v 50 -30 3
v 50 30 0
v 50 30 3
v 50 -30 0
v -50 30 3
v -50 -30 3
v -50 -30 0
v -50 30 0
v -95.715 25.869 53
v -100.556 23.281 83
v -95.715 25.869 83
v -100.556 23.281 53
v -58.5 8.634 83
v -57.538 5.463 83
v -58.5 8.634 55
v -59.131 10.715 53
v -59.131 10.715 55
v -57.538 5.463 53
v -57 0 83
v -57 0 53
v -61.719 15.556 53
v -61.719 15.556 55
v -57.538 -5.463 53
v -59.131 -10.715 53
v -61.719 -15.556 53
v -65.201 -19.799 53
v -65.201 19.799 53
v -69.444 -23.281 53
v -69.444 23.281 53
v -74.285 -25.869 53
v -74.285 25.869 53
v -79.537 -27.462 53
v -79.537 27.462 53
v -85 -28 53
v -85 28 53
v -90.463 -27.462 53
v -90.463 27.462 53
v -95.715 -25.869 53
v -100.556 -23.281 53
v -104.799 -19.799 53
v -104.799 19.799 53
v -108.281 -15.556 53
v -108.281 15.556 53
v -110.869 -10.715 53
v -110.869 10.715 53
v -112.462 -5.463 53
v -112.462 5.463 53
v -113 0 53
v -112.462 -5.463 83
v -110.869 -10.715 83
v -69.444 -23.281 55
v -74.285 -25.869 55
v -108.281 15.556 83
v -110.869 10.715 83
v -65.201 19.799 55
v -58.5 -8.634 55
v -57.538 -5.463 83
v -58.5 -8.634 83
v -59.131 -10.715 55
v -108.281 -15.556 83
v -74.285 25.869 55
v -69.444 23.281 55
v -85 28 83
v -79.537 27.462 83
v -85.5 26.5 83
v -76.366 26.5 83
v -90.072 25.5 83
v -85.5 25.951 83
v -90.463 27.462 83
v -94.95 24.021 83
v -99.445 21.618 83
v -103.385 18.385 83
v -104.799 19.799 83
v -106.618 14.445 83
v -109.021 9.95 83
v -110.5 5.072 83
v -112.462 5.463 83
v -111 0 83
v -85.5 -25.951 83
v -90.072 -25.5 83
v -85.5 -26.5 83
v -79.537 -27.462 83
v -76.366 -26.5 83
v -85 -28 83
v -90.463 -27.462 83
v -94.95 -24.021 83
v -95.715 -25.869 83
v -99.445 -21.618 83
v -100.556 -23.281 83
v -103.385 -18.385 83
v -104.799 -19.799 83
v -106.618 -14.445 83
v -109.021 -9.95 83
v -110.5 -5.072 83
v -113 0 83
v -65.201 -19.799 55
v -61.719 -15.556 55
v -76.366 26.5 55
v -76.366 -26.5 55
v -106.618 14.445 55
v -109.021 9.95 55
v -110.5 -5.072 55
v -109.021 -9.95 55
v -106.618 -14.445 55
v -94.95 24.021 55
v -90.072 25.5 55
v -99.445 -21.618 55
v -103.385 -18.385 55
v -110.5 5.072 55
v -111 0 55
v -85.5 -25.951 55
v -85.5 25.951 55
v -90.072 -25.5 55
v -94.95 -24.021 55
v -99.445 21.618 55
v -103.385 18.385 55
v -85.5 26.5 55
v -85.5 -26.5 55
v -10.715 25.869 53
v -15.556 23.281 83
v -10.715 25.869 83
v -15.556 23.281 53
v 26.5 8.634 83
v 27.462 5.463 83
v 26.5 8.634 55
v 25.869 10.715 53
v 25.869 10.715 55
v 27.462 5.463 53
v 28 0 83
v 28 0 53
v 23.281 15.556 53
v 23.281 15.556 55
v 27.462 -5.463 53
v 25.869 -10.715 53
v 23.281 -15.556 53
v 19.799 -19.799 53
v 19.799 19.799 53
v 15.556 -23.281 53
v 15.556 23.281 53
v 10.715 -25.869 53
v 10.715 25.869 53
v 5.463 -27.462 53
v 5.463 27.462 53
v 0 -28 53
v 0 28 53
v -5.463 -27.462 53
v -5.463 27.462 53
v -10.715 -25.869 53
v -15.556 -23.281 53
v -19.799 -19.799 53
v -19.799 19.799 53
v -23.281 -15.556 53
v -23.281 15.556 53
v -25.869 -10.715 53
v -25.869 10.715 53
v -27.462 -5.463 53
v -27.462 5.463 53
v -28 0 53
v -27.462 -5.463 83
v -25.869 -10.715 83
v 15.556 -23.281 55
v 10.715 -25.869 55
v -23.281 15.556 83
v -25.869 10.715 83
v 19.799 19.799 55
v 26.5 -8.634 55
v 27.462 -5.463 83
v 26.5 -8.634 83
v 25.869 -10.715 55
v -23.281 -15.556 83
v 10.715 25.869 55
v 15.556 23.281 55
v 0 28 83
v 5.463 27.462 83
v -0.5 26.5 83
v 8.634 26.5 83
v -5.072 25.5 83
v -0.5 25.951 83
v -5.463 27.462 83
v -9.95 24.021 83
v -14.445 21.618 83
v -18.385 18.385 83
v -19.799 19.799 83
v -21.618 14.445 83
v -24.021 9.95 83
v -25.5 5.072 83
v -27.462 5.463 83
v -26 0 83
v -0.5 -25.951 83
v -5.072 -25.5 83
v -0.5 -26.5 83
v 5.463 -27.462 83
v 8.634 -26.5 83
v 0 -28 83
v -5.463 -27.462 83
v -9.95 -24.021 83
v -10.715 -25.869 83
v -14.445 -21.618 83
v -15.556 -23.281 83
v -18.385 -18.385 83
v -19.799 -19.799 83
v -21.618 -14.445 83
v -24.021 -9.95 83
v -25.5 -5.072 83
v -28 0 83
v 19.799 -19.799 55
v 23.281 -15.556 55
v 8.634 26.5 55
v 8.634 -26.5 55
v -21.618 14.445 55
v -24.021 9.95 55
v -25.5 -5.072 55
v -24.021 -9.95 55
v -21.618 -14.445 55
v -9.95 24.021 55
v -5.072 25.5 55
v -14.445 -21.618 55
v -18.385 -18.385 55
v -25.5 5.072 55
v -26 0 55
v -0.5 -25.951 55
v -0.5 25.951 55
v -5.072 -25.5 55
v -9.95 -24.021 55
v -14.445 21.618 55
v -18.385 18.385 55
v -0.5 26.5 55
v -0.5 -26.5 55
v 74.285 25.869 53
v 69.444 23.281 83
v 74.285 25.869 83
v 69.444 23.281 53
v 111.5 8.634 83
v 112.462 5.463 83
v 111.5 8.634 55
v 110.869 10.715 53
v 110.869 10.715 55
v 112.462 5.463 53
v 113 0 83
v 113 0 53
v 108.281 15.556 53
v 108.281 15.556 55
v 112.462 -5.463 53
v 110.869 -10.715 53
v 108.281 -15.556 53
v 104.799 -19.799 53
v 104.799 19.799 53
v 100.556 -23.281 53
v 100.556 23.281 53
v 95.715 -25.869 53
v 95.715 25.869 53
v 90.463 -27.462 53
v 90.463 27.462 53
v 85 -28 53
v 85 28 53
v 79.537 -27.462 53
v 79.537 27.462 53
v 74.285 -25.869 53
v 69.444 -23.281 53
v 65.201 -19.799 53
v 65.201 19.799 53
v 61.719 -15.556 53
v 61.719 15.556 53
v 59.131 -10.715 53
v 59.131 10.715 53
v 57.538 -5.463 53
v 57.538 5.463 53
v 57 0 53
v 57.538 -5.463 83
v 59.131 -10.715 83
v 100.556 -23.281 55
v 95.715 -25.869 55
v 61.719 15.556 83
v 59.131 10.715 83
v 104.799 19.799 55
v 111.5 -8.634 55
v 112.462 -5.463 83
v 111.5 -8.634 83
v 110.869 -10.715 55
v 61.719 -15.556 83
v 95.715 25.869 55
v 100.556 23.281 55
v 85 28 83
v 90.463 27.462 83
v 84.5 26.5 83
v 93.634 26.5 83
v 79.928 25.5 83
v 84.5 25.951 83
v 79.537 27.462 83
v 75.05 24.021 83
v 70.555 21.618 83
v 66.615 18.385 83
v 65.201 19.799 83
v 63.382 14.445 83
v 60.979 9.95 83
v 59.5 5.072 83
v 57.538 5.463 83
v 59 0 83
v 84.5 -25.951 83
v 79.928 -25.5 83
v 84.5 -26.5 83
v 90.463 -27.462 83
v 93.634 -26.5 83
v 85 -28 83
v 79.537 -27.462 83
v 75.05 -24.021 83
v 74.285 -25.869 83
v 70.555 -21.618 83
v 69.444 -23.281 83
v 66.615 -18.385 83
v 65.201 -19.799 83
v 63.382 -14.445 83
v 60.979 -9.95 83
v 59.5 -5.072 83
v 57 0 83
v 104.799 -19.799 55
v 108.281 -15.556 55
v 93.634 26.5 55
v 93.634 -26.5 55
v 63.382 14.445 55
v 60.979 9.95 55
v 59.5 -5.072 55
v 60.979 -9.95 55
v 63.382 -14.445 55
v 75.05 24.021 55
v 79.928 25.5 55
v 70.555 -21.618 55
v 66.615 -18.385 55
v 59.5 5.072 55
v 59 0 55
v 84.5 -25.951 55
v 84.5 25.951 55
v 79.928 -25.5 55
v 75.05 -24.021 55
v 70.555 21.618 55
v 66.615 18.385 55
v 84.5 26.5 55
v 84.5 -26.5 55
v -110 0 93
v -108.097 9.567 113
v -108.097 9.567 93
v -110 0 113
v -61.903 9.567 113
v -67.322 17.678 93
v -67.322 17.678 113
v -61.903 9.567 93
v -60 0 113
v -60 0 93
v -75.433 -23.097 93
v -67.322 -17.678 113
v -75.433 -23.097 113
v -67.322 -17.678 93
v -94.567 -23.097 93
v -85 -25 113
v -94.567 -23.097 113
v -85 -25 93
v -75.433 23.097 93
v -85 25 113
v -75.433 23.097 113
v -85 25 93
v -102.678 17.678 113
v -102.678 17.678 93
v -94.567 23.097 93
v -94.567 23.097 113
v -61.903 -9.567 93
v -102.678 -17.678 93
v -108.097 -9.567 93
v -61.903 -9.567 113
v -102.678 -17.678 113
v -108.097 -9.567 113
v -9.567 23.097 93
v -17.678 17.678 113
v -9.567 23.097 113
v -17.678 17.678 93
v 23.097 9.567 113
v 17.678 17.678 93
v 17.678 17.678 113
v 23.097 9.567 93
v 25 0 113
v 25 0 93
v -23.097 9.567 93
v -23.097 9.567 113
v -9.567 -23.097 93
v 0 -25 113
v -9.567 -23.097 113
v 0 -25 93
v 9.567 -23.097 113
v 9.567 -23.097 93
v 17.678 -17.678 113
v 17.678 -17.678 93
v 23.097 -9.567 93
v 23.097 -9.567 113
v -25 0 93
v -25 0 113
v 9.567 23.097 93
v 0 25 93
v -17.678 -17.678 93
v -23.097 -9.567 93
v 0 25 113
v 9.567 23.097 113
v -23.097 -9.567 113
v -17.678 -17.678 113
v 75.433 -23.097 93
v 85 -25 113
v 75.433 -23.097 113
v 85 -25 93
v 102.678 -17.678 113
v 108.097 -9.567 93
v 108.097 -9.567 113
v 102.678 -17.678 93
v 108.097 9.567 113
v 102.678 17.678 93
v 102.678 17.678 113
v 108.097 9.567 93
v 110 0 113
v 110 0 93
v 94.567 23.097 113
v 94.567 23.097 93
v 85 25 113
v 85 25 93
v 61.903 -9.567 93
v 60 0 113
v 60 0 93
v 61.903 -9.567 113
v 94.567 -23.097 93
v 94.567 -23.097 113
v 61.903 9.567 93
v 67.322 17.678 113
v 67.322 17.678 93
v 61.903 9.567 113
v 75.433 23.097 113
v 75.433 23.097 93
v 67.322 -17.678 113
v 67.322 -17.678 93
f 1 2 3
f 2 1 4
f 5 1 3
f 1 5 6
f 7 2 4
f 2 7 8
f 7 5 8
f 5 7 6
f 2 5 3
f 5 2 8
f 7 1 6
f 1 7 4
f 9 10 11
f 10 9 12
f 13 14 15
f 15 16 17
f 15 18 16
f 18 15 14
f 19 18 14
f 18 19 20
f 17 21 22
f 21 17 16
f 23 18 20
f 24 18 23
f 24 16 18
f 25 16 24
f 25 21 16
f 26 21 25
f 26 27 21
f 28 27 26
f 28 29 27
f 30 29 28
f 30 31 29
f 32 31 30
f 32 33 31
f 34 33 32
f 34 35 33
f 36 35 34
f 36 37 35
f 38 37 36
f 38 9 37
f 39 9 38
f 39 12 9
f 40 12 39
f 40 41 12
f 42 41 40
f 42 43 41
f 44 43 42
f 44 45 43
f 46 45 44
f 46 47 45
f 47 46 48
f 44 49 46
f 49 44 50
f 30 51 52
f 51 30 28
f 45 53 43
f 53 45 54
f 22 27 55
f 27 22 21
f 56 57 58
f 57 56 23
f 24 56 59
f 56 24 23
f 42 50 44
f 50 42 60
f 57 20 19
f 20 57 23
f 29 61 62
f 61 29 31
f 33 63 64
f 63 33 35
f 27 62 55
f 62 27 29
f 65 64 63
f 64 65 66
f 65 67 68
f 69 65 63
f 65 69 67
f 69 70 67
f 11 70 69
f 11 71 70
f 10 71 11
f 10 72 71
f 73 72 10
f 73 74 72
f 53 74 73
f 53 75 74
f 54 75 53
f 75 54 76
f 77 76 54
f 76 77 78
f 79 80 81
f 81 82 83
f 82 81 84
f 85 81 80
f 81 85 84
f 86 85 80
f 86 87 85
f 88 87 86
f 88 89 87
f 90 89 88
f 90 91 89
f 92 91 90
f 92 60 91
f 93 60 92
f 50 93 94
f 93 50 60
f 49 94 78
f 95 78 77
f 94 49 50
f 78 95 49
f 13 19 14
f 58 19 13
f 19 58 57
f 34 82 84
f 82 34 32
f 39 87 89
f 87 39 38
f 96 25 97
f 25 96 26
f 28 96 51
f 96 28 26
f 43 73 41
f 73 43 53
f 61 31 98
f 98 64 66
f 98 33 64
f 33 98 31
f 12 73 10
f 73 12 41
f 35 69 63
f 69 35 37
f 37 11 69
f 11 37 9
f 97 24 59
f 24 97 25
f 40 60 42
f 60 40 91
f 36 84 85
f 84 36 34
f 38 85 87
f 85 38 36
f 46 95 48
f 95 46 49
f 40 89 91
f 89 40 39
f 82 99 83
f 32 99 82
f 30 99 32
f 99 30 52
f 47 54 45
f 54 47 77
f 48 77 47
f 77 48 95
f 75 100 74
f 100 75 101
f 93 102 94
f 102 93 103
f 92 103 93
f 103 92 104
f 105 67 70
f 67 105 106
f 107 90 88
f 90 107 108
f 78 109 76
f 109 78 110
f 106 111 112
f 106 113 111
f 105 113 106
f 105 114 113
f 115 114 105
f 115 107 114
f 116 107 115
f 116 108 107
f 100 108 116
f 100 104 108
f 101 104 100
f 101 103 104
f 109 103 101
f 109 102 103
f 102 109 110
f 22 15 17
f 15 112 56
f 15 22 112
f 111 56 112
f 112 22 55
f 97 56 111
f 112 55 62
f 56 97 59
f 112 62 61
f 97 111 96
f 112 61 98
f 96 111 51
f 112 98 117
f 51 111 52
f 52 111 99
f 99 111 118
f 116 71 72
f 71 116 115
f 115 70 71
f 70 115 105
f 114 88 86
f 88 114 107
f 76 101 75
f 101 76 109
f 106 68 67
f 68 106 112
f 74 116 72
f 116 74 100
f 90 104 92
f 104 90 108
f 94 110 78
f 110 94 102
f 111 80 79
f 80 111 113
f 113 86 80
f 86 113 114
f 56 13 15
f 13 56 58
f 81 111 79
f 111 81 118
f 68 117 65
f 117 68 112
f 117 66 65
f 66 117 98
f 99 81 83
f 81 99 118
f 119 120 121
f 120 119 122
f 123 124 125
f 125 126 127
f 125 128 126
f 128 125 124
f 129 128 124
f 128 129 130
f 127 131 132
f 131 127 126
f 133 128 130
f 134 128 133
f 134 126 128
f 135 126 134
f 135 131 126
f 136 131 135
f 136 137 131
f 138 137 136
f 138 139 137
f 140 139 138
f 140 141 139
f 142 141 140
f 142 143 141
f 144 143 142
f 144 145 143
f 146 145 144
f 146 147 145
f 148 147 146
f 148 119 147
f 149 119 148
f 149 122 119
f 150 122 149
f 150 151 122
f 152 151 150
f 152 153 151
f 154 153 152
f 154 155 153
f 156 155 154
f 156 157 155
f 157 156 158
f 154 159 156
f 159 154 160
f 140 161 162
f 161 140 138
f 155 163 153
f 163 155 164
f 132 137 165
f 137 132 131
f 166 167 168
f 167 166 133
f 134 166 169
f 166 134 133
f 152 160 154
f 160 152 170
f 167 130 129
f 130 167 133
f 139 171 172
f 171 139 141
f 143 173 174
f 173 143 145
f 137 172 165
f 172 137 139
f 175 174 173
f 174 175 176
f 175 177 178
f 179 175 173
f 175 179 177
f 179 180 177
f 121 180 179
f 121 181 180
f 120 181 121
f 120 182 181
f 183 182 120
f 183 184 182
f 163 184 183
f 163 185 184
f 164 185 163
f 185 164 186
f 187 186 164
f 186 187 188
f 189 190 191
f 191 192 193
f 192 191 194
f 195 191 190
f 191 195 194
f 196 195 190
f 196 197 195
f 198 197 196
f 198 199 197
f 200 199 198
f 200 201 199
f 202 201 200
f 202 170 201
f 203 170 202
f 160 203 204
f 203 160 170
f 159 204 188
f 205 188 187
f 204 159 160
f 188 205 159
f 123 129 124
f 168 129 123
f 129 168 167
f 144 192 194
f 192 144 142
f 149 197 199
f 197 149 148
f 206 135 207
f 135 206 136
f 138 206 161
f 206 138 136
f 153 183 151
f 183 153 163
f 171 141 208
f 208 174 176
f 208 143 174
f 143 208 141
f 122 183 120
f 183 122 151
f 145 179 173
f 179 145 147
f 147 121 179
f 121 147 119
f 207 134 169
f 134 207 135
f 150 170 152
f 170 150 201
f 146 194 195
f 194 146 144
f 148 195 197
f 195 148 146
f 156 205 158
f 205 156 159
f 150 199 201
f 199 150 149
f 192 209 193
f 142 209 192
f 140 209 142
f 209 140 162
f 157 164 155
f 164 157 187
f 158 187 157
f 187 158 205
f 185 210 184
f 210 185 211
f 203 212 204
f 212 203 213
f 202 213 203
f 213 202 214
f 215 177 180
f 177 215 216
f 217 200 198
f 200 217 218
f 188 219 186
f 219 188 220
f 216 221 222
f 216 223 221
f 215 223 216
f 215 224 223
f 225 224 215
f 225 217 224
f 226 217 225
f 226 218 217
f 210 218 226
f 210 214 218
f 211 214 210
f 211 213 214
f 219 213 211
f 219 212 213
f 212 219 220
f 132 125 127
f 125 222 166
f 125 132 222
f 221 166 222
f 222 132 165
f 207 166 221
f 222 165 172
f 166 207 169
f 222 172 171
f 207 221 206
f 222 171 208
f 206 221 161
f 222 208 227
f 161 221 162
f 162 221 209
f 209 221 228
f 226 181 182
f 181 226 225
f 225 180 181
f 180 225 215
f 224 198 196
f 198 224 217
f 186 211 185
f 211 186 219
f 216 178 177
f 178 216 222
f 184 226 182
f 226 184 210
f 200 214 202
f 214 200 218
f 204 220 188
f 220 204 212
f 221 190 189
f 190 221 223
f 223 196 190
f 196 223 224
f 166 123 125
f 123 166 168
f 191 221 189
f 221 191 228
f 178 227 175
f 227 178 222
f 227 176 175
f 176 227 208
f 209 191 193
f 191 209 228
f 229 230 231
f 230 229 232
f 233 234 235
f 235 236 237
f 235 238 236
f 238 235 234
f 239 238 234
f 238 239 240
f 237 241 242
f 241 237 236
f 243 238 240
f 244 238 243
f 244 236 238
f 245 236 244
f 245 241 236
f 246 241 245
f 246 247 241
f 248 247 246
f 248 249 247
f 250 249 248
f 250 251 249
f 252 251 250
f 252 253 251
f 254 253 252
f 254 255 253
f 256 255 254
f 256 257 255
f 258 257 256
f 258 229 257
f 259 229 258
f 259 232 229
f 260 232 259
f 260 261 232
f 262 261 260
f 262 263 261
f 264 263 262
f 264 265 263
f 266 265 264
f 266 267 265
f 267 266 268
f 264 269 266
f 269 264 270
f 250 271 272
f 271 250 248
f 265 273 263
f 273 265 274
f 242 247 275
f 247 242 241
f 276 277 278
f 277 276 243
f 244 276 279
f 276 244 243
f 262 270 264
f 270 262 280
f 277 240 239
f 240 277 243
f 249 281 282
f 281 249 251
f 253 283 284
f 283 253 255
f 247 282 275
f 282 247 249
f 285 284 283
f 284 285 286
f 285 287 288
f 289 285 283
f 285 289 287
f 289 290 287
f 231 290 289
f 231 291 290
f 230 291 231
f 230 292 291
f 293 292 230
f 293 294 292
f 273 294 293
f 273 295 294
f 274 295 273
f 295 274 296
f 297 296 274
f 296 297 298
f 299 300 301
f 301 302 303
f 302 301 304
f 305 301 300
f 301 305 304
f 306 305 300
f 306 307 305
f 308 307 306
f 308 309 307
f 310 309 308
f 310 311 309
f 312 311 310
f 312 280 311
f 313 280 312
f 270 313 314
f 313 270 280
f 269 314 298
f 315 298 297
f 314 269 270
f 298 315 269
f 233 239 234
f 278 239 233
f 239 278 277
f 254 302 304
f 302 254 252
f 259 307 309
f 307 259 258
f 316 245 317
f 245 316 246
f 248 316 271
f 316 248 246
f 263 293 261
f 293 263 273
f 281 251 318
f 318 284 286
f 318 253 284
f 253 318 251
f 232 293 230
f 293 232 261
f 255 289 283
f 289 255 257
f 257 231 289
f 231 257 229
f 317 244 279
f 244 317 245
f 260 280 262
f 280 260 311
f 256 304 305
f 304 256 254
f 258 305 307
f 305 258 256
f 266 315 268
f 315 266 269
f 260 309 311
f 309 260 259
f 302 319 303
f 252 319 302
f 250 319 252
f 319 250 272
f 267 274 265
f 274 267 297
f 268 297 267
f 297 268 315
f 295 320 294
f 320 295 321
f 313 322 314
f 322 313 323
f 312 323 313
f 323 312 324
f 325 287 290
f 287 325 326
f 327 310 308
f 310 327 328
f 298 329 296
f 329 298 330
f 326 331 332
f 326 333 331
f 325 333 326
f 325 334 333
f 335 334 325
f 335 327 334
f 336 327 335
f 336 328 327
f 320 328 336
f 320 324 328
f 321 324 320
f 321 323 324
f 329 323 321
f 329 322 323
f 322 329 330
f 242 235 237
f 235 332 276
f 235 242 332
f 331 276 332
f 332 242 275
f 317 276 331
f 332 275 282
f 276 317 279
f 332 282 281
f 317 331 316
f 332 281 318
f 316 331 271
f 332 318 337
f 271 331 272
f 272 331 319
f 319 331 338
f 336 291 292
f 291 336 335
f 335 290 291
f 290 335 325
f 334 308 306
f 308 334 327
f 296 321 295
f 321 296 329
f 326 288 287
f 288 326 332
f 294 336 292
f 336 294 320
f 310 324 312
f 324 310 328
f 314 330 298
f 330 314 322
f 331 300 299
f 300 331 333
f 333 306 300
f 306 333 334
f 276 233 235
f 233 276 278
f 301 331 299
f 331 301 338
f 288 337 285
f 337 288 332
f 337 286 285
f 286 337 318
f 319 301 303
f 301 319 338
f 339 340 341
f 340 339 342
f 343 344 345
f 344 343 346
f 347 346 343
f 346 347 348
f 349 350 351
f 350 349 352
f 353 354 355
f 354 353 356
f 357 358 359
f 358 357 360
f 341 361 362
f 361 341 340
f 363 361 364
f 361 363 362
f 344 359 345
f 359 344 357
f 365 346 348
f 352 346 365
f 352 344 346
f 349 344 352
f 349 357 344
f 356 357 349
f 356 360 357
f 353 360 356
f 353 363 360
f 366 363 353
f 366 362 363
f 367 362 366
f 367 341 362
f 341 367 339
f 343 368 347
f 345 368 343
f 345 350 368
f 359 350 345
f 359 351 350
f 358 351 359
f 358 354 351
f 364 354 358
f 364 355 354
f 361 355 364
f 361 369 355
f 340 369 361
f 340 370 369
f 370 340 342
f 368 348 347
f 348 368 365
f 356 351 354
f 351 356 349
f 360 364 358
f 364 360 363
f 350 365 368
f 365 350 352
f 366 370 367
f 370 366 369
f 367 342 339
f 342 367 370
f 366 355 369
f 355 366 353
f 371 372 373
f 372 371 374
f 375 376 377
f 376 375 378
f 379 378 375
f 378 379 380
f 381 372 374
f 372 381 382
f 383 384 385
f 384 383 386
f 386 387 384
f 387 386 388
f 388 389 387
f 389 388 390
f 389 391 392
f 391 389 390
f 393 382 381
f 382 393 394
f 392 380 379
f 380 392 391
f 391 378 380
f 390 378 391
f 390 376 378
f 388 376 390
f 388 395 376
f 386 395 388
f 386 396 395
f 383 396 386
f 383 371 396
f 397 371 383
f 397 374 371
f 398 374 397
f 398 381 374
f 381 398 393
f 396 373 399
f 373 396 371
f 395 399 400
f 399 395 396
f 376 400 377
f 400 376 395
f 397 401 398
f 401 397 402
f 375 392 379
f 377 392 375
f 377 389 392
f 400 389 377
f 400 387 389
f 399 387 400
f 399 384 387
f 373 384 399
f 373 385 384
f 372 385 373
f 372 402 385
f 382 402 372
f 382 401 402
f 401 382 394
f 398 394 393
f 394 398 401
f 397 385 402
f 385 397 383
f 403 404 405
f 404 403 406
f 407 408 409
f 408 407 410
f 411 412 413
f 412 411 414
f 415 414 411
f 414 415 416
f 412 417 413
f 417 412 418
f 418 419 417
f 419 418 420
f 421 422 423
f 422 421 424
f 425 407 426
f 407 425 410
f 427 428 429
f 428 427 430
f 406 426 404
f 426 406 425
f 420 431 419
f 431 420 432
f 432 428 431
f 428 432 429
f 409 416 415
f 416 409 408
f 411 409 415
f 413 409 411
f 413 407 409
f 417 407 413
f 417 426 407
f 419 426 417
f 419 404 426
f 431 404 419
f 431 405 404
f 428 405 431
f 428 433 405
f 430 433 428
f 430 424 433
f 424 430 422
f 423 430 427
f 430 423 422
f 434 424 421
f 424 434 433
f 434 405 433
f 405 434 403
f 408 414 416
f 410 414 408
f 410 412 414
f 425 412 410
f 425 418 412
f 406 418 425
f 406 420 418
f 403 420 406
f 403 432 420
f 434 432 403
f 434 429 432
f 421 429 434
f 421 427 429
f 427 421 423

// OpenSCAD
// file: ../models/part_two.scad
// ============================================================
// PART: Part Two
// Description: Holder/mount component for [PROJECT_NAME]
// ============================================================

include <../config.scad>
include <consts.scad>

// ============================================================
// PART MODULE
// ============================================================

// Module: part_two()
// Usage:
//   part_two();
//   part_two(height, wall);
// Description:
//   Creates a holder/mount component with a slot
// Arguments:
//   height = Overall height of the holder. Default: BASE_HEIGHT
//   wall = Wall thickness. Default: WALL_THICKNESS
// Example(3D): Standard holder
//   part_two();
// Example(3D): Taller holder with thicker walls
//   part_two(height=50, wall=3);
module part_two(
    height = BASE_HEIGHT,
    wall = WALL_THICKNESS
) {
    difference() {
        // Main body - cylinder or rounded rectangle
        translate([0, 0, height/2])
            cylinder(
                d = SLOT_WIDTH + wall * 2,
                h = height,
                center = true
            );

        // Slot for widget
        translate([0, 0, wall])
            cylinder(
                d = SLOT_WIDTH,
                h = height,
                center = false
            );

        // Side opening for insertion
        translate([SLOT_WIDTH/4, 0, height/2 + wall])
            cube([
                SLOT_WIDTH/2 + 1,
                SLOT_WIDTH + 1,
                height
            ], center = true);
    }
}

// ============================================================
// RENDER
// ============================================================

// Render this part when file is opened directly
part_two();
// file: ../models/part_one.scad
// ============================================================
// PART: Part One
// Description: Base plate for [PROJECT_NAME]
// ============================================================

include <../config.scad>
include <consts.scad>

// ============================================================
// PART MODULE
// ============================================================

// Module: part_one()
// Usage:
//   part_one();
//   part_one(width, depth, thickness);
// Description:
//   Creates the base plate with mounting holes
// Arguments:
//   width = Width of the base plate. Default: BASE_WIDTH
//   depth = Depth of the base plate. Default: BASE_DEPTH
//   thickness = Thickness of the plate. Default: FLOOR_THICKNESS
// Example(3D): Standard base plate
//   part_one();
// Example(3D): Custom sized base plate
//   part_one(width=150, depth=80, thickness=5);
module part_one(
    width = BASE_WIDTH,
    depth = BASE_DEPTH,
    thickness = FLOOR_THICKNESS
) {
    difference() {
        // Main plate body
        translate([0, 0, thickness/2])
            cube([width, depth, thickness], center = true);

        // Mounting holes at corners
        for (x = [-1, 1], y = [-1, 1]) {
            translate([
                x * MOUNTING_HOLE_SPACING/2,
                y * MOUNTING_HOLE_SPACING/2,
                -0.1
            ])
                cylinder(
                    d = MOUNTING_HOLE_DIAMETER,
                    h = thickness + 0.2,
                    $fn = EXPORT_MODE ? 64 : 16
                );
        }
    }
}

// ============================================================
// RENDER
// ============================================================

// Render this part when file is opened directly
part_one();
// file: ../models/consts.scad
// ============================================================
// SHARED CONSTANTS
// Description: Constants used by multiple parts in [PROJECT_NAME]
// ============================================================

// ============================================================
// WIDGET DIMENSIONS
// ============================================================
// Example: If your project holds/fits a specific object,
// define its dimensions here

// Widget dimensions (example - replace with your actual object)
WIDGET_DIAMETER = 50;
WIDGET_HEIGHT = 20;

// ============================================================
// CALCULATED DIMENSIONS
// ============================================================
// Dimensions derived from base constants and tolerances

// Slot/holder sizing with clearance
SLOT_WIDTH = WIDGET_DIAMETER + 2;      // 2mm total clearance
SLOT_HEIGHT = WIDGET_HEIGHT + 1;       // 1mm clearance

// Spacing between elements
ELEMENT_SPACING = WIDGET_DIAMETER + 10;  // 10mm gap between widgets

// ============================================================
// EXAMPLE USAGE
// ============================================================
// In your part files:
//   include <consts.scad>
//   cylinder(d = WIDGET_DIAMETER + TOLERANCE, h = WIDGET_HEIGHT);
// file: ../config.scad
// ============================================================
// PROJECT CONFIGURATION
// Description: Global settings for [PROJECT_NAME]
// ============================================================

// ============================================================
// RENDERING SETTINGS
// ============================================================

// Preview quality (lower = faster preview)
PREVIEW_FN = 32;

// Export quality (higher = smoother STL)
EXPORT_FN = 128;

// Current mode (set to true when exporting STL)
// Override from command line: openscad -D 'EXPORT_MODE=true' ...
EXPORT_MODE = false;

// Convenience variable - automatically use correct quality
$fn = EXPORT_MODE ? EXPORT_FN : PREVIEW_FN;

// ============================================================
// PROJECT DIMENSIONS
// ============================================================

// Base dimensions (millimeters)
BASE_WIDTH = 100;
BASE_DEPTH = 60;
BASE_HEIGHT = 30;

// Material settings
WALL_THICKNESS = 2;
FLOOR_THICKNESS = 3;

// Hardware
MOUNTING_HOLE_DIAMETER = 5;
MOUNTING_HOLE_SPACING = 80;

// ============================================================
// TOLERANCES
// ============================================================

// General fit tolerance (for sliding parts)
TOLERANCE = 0.2;

// Tight fit (press-fit, requires force)
TIGHT_FIT = 0.1;

// Loose fit (easy sliding, clearance)
LOOSE_FIT = 0.5;

// 3D printer compensation (add to holes, subtract from pegs)
PRINTER_TOLERANCE = 0.15;

// ============================================================
// FEATURE FLAGS
// ============================================================

// Enable experimental features
ENABLE_ADVANCED_FEATURES = false;

// Include support structures in export
INCLUDE_SUPPORTS = false;

// Show reference geometry in previews
SHOW_REFERENCE = true;

// ============================================================
// RENDERING HELPERS
// ============================================================

// Helper function to determine if we're in preview mode
function is_preview() = !EXPORT_MODE;

// Helper function to determine if we're in export mode
function is_export() = EXPORT_MODE;
// main file
// ============================================================
// PREVIEW: Exploded View
// Description: Exploded assembly showing part relationships
// ============================================================
// Useful for documentation and understanding assembly order

include <../config.scad>
include <../models/consts.scad>

use <../models/part_one.scad>
use <../models/part_two.scad>

// Override for faster preview
$fn = 16;

// Explosion distance
EXPLODE_DISTANCE = 50;

// ============================================================
// EXPLODED ASSEMBLY
// ============================================================

// Base plate (at origin)
color("lightblue")
    part_one();

// Holders - exploded upward and outward
color("gray") {
    for (i = [0 : 2]) {
        translate([
            (i - 1) * (ELEMENT_SPACING + EXPLODE_DISTANCE/2),
            0,
            FLOOR_THICKNESS + EXPLODE_DISTANCE
        ])
            part_two();
    }
}

// Widgets - exploded further up
if (SHOW_REFERENCE) {
    for (i = [0 : 2]) {
        translate([
            (i - 1) * (ELEMENT_SPACING + EXPLODE_DISTANCE/2),
            0,
            FLOOR_THICKNESS + EXPLODE_DISTANCE * 2
        ])
        color("black", alpha=0.3)
            cylinder(
                d = WIDGET_DIAMETER,
                h = WIDGET_HEIGHT,
                center = true,
                $fn = 16
            );
    }
}

// ============================================================
// ASSEMBLY ARROWS (OPTIONAL)
// ============================================================

// Show assembly direction with arrows
%color("green") {
    for (i = [0 : 2]) {
        translate([
            (i - 1) * (ELEMENT_SPACING + EXPLODE_DISTANCE/2),
            0,
            FLOOR_THICKNESS + EXPLODE_DISTANCE/2
        ])
            cylinder(d=1, h=EXPLODE_DISTANCE/2, $fn=8);
    }
}
